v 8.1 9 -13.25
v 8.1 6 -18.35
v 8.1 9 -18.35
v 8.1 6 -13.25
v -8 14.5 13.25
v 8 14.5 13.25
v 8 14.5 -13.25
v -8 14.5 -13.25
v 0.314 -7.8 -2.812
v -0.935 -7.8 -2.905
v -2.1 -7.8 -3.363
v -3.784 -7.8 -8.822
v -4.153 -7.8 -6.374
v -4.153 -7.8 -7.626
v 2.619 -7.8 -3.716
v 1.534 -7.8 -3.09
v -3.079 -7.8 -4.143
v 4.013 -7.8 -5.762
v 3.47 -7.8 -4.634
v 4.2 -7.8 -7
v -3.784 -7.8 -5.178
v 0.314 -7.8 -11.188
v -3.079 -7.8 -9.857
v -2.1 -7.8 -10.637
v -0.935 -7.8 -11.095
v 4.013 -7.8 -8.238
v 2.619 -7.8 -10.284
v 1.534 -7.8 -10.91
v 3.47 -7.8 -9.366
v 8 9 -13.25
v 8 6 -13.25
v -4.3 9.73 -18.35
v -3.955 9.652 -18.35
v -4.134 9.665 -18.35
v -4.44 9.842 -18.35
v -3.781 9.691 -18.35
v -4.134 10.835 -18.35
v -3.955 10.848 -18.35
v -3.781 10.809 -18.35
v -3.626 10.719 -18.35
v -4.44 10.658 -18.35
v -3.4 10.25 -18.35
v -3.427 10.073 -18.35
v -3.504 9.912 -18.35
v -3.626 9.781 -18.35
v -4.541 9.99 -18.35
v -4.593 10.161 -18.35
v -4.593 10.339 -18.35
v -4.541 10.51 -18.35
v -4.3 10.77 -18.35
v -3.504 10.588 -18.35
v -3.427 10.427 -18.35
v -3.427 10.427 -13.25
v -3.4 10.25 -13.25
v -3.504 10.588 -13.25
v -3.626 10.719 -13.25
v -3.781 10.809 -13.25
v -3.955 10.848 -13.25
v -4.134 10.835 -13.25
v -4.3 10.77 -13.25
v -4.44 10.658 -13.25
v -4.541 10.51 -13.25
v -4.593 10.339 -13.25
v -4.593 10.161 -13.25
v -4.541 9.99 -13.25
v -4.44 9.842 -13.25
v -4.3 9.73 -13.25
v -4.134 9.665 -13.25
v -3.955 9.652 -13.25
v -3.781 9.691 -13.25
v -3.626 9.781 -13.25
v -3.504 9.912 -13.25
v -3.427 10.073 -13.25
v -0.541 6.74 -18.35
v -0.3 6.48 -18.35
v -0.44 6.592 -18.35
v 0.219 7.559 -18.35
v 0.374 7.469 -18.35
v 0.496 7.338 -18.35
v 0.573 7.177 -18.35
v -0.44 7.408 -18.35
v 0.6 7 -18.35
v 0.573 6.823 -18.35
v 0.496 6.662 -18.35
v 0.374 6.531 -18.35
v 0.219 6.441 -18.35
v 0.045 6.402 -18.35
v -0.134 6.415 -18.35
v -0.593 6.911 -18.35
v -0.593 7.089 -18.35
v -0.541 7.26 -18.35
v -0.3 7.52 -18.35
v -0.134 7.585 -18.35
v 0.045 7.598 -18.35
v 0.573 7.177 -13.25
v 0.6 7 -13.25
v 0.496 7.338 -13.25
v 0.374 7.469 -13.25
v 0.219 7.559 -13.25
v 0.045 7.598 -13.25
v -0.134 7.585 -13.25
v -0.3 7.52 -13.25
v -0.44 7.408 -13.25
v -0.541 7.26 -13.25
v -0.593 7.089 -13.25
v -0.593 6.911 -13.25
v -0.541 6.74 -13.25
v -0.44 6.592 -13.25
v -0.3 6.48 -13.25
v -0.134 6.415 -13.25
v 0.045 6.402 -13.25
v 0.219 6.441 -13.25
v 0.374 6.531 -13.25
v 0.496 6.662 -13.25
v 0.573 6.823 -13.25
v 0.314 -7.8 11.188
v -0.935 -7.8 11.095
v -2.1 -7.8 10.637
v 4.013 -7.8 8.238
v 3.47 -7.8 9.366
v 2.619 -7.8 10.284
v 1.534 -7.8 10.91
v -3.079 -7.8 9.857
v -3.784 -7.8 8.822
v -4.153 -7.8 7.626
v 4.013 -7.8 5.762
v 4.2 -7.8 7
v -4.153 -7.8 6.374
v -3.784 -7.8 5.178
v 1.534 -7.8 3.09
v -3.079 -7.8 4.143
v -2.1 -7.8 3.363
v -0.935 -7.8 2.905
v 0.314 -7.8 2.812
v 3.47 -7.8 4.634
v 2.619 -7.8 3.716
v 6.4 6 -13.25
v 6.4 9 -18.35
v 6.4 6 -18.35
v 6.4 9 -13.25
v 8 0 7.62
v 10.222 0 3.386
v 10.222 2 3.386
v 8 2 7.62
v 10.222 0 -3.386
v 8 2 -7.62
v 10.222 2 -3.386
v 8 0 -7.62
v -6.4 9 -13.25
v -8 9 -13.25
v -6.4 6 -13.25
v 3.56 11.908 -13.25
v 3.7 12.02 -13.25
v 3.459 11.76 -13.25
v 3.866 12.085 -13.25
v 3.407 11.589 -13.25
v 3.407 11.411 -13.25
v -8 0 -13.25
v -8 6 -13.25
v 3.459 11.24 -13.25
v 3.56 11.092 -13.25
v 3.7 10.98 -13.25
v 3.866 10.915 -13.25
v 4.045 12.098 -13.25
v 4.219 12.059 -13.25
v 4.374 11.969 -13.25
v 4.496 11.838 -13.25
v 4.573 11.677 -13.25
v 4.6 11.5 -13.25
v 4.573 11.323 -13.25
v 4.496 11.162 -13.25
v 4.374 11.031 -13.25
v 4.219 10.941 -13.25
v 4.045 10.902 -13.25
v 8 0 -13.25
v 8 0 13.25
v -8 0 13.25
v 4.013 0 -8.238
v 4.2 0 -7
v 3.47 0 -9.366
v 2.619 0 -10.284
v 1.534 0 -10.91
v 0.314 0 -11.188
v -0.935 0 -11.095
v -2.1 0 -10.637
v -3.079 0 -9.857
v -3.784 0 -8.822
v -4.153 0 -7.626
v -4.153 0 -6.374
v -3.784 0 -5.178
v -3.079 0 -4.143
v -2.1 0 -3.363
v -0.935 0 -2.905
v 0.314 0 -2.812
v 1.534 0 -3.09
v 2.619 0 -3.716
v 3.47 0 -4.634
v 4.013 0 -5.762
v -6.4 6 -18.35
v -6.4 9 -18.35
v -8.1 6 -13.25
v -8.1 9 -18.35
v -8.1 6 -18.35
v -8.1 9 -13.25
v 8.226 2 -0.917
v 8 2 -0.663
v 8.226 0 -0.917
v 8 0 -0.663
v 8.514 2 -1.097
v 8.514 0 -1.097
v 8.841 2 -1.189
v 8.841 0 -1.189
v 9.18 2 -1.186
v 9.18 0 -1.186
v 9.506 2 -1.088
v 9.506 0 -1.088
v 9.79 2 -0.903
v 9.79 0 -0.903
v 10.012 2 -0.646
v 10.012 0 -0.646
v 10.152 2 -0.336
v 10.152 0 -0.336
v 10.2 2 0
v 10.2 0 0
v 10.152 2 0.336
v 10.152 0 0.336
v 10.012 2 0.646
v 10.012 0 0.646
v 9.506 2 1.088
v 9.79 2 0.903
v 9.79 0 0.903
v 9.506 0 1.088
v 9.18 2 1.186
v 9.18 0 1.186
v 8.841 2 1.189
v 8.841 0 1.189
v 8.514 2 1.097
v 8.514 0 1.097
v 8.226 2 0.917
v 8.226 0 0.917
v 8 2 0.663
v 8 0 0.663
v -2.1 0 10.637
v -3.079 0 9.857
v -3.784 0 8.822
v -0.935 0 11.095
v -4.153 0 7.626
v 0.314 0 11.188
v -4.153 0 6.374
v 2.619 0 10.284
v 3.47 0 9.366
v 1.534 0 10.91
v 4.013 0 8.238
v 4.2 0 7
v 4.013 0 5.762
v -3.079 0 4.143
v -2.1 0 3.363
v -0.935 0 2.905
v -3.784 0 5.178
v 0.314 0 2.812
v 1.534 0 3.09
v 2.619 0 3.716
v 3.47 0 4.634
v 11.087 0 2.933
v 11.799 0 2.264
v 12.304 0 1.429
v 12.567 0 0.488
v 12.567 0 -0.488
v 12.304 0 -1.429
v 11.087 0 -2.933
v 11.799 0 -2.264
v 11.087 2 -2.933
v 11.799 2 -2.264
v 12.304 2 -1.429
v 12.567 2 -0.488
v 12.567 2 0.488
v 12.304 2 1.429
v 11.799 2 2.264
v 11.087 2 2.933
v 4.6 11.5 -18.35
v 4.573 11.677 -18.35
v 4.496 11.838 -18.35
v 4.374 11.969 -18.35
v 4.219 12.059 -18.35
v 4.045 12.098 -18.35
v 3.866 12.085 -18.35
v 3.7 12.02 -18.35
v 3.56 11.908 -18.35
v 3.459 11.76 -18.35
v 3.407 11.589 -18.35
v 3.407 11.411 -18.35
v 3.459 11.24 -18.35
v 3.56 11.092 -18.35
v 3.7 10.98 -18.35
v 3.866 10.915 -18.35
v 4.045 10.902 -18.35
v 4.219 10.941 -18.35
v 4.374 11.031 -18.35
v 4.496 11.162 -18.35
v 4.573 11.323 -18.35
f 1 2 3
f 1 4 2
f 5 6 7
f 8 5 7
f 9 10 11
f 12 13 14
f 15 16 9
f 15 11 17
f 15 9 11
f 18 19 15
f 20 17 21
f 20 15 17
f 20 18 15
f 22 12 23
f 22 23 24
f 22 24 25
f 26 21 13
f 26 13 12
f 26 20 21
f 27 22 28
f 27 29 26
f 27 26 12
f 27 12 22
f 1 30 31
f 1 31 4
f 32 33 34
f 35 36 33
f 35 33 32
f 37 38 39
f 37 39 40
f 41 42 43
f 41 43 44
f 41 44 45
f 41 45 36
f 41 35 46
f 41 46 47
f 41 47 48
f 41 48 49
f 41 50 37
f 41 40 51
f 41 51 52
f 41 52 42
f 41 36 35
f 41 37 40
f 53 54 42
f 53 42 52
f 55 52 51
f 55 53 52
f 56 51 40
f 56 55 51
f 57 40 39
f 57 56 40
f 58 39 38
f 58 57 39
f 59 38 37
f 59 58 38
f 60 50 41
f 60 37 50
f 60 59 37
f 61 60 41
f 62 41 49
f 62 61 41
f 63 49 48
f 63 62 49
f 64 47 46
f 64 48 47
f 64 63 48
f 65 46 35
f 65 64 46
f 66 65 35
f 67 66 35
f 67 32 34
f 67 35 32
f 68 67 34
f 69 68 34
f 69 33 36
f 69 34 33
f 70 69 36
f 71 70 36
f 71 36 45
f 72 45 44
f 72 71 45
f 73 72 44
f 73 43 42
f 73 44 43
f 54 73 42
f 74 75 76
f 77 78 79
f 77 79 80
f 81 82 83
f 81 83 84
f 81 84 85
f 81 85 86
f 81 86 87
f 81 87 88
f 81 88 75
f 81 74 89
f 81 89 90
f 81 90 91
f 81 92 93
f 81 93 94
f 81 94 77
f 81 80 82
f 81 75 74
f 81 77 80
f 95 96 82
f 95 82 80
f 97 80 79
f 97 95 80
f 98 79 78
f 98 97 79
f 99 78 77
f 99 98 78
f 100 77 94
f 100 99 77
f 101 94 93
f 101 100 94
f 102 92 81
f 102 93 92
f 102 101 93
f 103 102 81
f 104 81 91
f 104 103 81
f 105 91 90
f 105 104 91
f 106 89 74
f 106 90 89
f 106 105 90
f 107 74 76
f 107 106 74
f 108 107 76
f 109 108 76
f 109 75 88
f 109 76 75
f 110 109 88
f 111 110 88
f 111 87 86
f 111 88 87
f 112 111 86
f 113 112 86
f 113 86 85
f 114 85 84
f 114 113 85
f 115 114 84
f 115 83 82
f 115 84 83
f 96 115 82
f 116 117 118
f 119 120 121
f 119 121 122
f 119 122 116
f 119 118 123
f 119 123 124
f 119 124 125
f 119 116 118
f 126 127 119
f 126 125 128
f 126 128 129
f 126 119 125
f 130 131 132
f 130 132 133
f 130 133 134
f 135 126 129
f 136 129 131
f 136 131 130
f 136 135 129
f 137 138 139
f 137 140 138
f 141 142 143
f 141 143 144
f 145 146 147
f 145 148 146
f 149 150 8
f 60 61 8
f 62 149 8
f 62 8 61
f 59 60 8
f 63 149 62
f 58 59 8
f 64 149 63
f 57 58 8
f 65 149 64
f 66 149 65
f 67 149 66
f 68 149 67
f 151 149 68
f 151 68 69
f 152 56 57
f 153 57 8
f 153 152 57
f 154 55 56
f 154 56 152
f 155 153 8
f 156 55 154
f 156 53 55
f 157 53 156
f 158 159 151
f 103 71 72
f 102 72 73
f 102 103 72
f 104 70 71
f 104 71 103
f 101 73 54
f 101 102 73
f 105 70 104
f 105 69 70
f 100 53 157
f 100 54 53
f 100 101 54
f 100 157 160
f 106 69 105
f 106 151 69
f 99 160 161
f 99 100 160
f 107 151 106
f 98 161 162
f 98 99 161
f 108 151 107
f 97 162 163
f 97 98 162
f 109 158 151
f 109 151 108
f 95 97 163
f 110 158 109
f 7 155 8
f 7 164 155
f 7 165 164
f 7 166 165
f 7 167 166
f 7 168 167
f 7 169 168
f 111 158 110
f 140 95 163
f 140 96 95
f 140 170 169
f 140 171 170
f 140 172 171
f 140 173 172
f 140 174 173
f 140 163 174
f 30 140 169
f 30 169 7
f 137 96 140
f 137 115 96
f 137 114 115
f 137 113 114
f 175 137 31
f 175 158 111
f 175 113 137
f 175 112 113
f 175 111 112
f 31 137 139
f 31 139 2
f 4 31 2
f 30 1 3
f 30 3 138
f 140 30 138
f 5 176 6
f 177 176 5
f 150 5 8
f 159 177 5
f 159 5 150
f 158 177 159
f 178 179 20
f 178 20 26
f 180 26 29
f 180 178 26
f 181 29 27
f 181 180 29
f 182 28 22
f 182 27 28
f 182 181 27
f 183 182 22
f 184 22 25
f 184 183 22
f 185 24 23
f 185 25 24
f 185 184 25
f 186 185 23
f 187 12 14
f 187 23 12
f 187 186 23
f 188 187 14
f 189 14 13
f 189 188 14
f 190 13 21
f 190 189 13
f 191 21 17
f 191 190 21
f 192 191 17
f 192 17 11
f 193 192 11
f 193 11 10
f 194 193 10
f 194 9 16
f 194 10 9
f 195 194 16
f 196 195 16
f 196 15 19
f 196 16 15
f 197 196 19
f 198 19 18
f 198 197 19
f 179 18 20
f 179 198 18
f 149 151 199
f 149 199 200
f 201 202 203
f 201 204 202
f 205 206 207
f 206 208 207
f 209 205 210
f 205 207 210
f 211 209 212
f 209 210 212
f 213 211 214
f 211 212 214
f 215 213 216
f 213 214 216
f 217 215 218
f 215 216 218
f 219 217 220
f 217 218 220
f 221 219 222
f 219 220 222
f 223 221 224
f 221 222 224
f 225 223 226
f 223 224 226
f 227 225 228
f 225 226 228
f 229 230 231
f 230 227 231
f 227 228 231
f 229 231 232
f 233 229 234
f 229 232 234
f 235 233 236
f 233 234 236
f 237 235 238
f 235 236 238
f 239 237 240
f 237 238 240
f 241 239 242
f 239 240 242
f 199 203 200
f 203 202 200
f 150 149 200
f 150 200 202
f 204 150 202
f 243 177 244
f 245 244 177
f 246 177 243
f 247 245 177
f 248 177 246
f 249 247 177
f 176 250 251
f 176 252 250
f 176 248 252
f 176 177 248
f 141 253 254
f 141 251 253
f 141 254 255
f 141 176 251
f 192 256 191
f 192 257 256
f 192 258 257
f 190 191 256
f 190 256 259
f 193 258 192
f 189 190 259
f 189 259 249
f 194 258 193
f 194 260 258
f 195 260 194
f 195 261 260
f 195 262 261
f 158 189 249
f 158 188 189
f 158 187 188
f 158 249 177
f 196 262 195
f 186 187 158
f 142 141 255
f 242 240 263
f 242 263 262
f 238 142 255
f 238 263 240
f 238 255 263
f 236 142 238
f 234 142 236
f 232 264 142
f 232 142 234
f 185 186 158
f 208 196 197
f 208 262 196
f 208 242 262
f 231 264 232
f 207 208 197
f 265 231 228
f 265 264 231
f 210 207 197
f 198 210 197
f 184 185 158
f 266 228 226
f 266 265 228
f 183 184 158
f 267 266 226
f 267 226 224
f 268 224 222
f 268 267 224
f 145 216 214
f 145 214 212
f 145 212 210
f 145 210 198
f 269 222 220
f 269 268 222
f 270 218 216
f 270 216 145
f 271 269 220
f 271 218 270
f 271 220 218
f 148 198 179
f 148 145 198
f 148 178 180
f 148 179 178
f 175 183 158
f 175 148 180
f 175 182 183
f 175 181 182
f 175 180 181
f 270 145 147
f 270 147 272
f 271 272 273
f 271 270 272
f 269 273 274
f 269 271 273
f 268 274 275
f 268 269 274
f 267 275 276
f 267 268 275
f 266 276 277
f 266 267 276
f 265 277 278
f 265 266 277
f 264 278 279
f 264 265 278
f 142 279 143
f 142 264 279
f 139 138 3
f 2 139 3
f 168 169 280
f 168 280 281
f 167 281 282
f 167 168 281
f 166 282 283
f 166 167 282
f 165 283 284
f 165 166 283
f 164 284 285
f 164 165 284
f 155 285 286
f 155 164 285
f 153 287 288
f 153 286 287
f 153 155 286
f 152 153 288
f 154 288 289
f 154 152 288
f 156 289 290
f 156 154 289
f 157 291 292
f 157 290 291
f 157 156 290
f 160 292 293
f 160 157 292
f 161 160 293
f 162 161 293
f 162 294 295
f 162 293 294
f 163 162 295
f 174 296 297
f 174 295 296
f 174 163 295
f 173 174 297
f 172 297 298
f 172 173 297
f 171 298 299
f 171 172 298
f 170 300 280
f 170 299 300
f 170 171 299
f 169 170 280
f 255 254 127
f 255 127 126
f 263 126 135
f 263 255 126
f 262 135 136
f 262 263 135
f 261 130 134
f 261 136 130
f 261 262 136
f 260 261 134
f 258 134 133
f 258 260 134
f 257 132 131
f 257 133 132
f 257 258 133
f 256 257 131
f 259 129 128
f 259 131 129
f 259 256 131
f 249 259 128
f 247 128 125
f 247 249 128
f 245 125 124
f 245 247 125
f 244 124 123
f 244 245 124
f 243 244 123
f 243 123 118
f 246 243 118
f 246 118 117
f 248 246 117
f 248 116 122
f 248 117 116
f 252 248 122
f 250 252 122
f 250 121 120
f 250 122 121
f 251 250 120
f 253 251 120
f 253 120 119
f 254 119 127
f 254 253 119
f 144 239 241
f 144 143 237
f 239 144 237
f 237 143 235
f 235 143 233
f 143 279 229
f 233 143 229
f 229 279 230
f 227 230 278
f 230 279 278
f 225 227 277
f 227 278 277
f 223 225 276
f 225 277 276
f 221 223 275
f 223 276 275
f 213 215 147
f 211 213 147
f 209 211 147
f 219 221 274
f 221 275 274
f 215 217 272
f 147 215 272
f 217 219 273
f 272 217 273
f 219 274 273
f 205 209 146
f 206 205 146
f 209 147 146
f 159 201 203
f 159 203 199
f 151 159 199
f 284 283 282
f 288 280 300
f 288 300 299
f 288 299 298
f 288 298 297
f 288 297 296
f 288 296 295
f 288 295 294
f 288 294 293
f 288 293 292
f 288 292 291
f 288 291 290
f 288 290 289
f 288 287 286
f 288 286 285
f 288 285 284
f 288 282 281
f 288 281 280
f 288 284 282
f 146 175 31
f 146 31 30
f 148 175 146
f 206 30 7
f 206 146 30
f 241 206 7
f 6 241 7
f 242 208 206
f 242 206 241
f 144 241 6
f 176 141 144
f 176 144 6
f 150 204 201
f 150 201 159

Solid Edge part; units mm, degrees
sketch "Sketch1" plane through (0, 0, 0) normal (0, -1, 0) x (1, 0, 0)
  circle A0 centre (0, -7) radius 4.2
  circle A1 centre (0, 7) radius 4.2
  dimension "D1" = 8.4
  dimension "D2" = 14
extrude "Protrusion1" add sketch "Sketch1" along normal blind 7.8
sketch "Sketch2" plane through (0, 0, -7) normal (0, 1, 0) x (-1, 0, 0)
  line L0 (8, -6.25) -> (-8, -6.25)
  line L1 (-8, -6.25) -> (-8, 20.25)
  line L2 (-8, 20.25) -> (8, 20.25)
  line L3 (8, 20.25) -> (8, -6.25)
extrude "ExtrudedProtrusion_2" add sketch "Sketch2" along normal blind 14.5
sketch "Sketch3" plane through (0, 7.25, -13.25) normal (0, 0, -1) x (1, 0, 0)
  line L0 (-6.4, 1.25) -> (-6.4, -1.75)
  line L1 (-6.4, -1.75) -> (-8.1, -1.75)
  line L2 (-8.1, -1.75) -> (-8.1, 1.25)
  line L3 (-8.1, 1.25) -> (-6.4, 1.25)
  circle A0 centre (4, -4.25) radius 0.6
  circle A1 centre (-4, -3) radius 0.6
  circle A2 centre (0, 0.25) radius 0.6
  line L4 (6.4, 1.25) -> (8.1, 1.25)
  line L5 (8.1, 1.25) -> (8.1, -1.75)
  line L6 (8.1, -1.75) -> (6.4, -1.75)
  line L7 (6.4, -1.75) -> (6.4, 1.25)
  dimension "D1" = 1.2
  dimension "D2" = 7
  dimension "D3" = 3.25
  dimension "D4" = 1.25
  dimension "D5" = 1.7
  dimension "D6" = 3
  dimension "D7" = 14.5
  dimension "D8" = 2.75
  dimension "D9" = 8
extrude "ExtrudedProtrusion_3" add sketch "Sketch3" along normal blind 5.1
sketch "Sketch4" plane through (0, 0, 0) normal (0, -1, 0) x (1, 0, 0)
  line L0 (8, -0.6633) -> (8, -7.62)
  line L1 (8, -7.62) -> (10.2225, -3.3861)
  arc A0 (10.2225, 3.3861) -> (10.2225, -3.3861) centre (9, 0) cw
  line L2 (10.2225, 3.3861) -> (8, 7.62)
  line L3 (8, 7.62) -> (8, 0.6633)
  arc A1 (8, 0.6633) -> (8, -0.6633) centre (9, 0) cw
extrude "ExtrudedProtrusion_4" add sketch "Sketch4" against normal blind 2
